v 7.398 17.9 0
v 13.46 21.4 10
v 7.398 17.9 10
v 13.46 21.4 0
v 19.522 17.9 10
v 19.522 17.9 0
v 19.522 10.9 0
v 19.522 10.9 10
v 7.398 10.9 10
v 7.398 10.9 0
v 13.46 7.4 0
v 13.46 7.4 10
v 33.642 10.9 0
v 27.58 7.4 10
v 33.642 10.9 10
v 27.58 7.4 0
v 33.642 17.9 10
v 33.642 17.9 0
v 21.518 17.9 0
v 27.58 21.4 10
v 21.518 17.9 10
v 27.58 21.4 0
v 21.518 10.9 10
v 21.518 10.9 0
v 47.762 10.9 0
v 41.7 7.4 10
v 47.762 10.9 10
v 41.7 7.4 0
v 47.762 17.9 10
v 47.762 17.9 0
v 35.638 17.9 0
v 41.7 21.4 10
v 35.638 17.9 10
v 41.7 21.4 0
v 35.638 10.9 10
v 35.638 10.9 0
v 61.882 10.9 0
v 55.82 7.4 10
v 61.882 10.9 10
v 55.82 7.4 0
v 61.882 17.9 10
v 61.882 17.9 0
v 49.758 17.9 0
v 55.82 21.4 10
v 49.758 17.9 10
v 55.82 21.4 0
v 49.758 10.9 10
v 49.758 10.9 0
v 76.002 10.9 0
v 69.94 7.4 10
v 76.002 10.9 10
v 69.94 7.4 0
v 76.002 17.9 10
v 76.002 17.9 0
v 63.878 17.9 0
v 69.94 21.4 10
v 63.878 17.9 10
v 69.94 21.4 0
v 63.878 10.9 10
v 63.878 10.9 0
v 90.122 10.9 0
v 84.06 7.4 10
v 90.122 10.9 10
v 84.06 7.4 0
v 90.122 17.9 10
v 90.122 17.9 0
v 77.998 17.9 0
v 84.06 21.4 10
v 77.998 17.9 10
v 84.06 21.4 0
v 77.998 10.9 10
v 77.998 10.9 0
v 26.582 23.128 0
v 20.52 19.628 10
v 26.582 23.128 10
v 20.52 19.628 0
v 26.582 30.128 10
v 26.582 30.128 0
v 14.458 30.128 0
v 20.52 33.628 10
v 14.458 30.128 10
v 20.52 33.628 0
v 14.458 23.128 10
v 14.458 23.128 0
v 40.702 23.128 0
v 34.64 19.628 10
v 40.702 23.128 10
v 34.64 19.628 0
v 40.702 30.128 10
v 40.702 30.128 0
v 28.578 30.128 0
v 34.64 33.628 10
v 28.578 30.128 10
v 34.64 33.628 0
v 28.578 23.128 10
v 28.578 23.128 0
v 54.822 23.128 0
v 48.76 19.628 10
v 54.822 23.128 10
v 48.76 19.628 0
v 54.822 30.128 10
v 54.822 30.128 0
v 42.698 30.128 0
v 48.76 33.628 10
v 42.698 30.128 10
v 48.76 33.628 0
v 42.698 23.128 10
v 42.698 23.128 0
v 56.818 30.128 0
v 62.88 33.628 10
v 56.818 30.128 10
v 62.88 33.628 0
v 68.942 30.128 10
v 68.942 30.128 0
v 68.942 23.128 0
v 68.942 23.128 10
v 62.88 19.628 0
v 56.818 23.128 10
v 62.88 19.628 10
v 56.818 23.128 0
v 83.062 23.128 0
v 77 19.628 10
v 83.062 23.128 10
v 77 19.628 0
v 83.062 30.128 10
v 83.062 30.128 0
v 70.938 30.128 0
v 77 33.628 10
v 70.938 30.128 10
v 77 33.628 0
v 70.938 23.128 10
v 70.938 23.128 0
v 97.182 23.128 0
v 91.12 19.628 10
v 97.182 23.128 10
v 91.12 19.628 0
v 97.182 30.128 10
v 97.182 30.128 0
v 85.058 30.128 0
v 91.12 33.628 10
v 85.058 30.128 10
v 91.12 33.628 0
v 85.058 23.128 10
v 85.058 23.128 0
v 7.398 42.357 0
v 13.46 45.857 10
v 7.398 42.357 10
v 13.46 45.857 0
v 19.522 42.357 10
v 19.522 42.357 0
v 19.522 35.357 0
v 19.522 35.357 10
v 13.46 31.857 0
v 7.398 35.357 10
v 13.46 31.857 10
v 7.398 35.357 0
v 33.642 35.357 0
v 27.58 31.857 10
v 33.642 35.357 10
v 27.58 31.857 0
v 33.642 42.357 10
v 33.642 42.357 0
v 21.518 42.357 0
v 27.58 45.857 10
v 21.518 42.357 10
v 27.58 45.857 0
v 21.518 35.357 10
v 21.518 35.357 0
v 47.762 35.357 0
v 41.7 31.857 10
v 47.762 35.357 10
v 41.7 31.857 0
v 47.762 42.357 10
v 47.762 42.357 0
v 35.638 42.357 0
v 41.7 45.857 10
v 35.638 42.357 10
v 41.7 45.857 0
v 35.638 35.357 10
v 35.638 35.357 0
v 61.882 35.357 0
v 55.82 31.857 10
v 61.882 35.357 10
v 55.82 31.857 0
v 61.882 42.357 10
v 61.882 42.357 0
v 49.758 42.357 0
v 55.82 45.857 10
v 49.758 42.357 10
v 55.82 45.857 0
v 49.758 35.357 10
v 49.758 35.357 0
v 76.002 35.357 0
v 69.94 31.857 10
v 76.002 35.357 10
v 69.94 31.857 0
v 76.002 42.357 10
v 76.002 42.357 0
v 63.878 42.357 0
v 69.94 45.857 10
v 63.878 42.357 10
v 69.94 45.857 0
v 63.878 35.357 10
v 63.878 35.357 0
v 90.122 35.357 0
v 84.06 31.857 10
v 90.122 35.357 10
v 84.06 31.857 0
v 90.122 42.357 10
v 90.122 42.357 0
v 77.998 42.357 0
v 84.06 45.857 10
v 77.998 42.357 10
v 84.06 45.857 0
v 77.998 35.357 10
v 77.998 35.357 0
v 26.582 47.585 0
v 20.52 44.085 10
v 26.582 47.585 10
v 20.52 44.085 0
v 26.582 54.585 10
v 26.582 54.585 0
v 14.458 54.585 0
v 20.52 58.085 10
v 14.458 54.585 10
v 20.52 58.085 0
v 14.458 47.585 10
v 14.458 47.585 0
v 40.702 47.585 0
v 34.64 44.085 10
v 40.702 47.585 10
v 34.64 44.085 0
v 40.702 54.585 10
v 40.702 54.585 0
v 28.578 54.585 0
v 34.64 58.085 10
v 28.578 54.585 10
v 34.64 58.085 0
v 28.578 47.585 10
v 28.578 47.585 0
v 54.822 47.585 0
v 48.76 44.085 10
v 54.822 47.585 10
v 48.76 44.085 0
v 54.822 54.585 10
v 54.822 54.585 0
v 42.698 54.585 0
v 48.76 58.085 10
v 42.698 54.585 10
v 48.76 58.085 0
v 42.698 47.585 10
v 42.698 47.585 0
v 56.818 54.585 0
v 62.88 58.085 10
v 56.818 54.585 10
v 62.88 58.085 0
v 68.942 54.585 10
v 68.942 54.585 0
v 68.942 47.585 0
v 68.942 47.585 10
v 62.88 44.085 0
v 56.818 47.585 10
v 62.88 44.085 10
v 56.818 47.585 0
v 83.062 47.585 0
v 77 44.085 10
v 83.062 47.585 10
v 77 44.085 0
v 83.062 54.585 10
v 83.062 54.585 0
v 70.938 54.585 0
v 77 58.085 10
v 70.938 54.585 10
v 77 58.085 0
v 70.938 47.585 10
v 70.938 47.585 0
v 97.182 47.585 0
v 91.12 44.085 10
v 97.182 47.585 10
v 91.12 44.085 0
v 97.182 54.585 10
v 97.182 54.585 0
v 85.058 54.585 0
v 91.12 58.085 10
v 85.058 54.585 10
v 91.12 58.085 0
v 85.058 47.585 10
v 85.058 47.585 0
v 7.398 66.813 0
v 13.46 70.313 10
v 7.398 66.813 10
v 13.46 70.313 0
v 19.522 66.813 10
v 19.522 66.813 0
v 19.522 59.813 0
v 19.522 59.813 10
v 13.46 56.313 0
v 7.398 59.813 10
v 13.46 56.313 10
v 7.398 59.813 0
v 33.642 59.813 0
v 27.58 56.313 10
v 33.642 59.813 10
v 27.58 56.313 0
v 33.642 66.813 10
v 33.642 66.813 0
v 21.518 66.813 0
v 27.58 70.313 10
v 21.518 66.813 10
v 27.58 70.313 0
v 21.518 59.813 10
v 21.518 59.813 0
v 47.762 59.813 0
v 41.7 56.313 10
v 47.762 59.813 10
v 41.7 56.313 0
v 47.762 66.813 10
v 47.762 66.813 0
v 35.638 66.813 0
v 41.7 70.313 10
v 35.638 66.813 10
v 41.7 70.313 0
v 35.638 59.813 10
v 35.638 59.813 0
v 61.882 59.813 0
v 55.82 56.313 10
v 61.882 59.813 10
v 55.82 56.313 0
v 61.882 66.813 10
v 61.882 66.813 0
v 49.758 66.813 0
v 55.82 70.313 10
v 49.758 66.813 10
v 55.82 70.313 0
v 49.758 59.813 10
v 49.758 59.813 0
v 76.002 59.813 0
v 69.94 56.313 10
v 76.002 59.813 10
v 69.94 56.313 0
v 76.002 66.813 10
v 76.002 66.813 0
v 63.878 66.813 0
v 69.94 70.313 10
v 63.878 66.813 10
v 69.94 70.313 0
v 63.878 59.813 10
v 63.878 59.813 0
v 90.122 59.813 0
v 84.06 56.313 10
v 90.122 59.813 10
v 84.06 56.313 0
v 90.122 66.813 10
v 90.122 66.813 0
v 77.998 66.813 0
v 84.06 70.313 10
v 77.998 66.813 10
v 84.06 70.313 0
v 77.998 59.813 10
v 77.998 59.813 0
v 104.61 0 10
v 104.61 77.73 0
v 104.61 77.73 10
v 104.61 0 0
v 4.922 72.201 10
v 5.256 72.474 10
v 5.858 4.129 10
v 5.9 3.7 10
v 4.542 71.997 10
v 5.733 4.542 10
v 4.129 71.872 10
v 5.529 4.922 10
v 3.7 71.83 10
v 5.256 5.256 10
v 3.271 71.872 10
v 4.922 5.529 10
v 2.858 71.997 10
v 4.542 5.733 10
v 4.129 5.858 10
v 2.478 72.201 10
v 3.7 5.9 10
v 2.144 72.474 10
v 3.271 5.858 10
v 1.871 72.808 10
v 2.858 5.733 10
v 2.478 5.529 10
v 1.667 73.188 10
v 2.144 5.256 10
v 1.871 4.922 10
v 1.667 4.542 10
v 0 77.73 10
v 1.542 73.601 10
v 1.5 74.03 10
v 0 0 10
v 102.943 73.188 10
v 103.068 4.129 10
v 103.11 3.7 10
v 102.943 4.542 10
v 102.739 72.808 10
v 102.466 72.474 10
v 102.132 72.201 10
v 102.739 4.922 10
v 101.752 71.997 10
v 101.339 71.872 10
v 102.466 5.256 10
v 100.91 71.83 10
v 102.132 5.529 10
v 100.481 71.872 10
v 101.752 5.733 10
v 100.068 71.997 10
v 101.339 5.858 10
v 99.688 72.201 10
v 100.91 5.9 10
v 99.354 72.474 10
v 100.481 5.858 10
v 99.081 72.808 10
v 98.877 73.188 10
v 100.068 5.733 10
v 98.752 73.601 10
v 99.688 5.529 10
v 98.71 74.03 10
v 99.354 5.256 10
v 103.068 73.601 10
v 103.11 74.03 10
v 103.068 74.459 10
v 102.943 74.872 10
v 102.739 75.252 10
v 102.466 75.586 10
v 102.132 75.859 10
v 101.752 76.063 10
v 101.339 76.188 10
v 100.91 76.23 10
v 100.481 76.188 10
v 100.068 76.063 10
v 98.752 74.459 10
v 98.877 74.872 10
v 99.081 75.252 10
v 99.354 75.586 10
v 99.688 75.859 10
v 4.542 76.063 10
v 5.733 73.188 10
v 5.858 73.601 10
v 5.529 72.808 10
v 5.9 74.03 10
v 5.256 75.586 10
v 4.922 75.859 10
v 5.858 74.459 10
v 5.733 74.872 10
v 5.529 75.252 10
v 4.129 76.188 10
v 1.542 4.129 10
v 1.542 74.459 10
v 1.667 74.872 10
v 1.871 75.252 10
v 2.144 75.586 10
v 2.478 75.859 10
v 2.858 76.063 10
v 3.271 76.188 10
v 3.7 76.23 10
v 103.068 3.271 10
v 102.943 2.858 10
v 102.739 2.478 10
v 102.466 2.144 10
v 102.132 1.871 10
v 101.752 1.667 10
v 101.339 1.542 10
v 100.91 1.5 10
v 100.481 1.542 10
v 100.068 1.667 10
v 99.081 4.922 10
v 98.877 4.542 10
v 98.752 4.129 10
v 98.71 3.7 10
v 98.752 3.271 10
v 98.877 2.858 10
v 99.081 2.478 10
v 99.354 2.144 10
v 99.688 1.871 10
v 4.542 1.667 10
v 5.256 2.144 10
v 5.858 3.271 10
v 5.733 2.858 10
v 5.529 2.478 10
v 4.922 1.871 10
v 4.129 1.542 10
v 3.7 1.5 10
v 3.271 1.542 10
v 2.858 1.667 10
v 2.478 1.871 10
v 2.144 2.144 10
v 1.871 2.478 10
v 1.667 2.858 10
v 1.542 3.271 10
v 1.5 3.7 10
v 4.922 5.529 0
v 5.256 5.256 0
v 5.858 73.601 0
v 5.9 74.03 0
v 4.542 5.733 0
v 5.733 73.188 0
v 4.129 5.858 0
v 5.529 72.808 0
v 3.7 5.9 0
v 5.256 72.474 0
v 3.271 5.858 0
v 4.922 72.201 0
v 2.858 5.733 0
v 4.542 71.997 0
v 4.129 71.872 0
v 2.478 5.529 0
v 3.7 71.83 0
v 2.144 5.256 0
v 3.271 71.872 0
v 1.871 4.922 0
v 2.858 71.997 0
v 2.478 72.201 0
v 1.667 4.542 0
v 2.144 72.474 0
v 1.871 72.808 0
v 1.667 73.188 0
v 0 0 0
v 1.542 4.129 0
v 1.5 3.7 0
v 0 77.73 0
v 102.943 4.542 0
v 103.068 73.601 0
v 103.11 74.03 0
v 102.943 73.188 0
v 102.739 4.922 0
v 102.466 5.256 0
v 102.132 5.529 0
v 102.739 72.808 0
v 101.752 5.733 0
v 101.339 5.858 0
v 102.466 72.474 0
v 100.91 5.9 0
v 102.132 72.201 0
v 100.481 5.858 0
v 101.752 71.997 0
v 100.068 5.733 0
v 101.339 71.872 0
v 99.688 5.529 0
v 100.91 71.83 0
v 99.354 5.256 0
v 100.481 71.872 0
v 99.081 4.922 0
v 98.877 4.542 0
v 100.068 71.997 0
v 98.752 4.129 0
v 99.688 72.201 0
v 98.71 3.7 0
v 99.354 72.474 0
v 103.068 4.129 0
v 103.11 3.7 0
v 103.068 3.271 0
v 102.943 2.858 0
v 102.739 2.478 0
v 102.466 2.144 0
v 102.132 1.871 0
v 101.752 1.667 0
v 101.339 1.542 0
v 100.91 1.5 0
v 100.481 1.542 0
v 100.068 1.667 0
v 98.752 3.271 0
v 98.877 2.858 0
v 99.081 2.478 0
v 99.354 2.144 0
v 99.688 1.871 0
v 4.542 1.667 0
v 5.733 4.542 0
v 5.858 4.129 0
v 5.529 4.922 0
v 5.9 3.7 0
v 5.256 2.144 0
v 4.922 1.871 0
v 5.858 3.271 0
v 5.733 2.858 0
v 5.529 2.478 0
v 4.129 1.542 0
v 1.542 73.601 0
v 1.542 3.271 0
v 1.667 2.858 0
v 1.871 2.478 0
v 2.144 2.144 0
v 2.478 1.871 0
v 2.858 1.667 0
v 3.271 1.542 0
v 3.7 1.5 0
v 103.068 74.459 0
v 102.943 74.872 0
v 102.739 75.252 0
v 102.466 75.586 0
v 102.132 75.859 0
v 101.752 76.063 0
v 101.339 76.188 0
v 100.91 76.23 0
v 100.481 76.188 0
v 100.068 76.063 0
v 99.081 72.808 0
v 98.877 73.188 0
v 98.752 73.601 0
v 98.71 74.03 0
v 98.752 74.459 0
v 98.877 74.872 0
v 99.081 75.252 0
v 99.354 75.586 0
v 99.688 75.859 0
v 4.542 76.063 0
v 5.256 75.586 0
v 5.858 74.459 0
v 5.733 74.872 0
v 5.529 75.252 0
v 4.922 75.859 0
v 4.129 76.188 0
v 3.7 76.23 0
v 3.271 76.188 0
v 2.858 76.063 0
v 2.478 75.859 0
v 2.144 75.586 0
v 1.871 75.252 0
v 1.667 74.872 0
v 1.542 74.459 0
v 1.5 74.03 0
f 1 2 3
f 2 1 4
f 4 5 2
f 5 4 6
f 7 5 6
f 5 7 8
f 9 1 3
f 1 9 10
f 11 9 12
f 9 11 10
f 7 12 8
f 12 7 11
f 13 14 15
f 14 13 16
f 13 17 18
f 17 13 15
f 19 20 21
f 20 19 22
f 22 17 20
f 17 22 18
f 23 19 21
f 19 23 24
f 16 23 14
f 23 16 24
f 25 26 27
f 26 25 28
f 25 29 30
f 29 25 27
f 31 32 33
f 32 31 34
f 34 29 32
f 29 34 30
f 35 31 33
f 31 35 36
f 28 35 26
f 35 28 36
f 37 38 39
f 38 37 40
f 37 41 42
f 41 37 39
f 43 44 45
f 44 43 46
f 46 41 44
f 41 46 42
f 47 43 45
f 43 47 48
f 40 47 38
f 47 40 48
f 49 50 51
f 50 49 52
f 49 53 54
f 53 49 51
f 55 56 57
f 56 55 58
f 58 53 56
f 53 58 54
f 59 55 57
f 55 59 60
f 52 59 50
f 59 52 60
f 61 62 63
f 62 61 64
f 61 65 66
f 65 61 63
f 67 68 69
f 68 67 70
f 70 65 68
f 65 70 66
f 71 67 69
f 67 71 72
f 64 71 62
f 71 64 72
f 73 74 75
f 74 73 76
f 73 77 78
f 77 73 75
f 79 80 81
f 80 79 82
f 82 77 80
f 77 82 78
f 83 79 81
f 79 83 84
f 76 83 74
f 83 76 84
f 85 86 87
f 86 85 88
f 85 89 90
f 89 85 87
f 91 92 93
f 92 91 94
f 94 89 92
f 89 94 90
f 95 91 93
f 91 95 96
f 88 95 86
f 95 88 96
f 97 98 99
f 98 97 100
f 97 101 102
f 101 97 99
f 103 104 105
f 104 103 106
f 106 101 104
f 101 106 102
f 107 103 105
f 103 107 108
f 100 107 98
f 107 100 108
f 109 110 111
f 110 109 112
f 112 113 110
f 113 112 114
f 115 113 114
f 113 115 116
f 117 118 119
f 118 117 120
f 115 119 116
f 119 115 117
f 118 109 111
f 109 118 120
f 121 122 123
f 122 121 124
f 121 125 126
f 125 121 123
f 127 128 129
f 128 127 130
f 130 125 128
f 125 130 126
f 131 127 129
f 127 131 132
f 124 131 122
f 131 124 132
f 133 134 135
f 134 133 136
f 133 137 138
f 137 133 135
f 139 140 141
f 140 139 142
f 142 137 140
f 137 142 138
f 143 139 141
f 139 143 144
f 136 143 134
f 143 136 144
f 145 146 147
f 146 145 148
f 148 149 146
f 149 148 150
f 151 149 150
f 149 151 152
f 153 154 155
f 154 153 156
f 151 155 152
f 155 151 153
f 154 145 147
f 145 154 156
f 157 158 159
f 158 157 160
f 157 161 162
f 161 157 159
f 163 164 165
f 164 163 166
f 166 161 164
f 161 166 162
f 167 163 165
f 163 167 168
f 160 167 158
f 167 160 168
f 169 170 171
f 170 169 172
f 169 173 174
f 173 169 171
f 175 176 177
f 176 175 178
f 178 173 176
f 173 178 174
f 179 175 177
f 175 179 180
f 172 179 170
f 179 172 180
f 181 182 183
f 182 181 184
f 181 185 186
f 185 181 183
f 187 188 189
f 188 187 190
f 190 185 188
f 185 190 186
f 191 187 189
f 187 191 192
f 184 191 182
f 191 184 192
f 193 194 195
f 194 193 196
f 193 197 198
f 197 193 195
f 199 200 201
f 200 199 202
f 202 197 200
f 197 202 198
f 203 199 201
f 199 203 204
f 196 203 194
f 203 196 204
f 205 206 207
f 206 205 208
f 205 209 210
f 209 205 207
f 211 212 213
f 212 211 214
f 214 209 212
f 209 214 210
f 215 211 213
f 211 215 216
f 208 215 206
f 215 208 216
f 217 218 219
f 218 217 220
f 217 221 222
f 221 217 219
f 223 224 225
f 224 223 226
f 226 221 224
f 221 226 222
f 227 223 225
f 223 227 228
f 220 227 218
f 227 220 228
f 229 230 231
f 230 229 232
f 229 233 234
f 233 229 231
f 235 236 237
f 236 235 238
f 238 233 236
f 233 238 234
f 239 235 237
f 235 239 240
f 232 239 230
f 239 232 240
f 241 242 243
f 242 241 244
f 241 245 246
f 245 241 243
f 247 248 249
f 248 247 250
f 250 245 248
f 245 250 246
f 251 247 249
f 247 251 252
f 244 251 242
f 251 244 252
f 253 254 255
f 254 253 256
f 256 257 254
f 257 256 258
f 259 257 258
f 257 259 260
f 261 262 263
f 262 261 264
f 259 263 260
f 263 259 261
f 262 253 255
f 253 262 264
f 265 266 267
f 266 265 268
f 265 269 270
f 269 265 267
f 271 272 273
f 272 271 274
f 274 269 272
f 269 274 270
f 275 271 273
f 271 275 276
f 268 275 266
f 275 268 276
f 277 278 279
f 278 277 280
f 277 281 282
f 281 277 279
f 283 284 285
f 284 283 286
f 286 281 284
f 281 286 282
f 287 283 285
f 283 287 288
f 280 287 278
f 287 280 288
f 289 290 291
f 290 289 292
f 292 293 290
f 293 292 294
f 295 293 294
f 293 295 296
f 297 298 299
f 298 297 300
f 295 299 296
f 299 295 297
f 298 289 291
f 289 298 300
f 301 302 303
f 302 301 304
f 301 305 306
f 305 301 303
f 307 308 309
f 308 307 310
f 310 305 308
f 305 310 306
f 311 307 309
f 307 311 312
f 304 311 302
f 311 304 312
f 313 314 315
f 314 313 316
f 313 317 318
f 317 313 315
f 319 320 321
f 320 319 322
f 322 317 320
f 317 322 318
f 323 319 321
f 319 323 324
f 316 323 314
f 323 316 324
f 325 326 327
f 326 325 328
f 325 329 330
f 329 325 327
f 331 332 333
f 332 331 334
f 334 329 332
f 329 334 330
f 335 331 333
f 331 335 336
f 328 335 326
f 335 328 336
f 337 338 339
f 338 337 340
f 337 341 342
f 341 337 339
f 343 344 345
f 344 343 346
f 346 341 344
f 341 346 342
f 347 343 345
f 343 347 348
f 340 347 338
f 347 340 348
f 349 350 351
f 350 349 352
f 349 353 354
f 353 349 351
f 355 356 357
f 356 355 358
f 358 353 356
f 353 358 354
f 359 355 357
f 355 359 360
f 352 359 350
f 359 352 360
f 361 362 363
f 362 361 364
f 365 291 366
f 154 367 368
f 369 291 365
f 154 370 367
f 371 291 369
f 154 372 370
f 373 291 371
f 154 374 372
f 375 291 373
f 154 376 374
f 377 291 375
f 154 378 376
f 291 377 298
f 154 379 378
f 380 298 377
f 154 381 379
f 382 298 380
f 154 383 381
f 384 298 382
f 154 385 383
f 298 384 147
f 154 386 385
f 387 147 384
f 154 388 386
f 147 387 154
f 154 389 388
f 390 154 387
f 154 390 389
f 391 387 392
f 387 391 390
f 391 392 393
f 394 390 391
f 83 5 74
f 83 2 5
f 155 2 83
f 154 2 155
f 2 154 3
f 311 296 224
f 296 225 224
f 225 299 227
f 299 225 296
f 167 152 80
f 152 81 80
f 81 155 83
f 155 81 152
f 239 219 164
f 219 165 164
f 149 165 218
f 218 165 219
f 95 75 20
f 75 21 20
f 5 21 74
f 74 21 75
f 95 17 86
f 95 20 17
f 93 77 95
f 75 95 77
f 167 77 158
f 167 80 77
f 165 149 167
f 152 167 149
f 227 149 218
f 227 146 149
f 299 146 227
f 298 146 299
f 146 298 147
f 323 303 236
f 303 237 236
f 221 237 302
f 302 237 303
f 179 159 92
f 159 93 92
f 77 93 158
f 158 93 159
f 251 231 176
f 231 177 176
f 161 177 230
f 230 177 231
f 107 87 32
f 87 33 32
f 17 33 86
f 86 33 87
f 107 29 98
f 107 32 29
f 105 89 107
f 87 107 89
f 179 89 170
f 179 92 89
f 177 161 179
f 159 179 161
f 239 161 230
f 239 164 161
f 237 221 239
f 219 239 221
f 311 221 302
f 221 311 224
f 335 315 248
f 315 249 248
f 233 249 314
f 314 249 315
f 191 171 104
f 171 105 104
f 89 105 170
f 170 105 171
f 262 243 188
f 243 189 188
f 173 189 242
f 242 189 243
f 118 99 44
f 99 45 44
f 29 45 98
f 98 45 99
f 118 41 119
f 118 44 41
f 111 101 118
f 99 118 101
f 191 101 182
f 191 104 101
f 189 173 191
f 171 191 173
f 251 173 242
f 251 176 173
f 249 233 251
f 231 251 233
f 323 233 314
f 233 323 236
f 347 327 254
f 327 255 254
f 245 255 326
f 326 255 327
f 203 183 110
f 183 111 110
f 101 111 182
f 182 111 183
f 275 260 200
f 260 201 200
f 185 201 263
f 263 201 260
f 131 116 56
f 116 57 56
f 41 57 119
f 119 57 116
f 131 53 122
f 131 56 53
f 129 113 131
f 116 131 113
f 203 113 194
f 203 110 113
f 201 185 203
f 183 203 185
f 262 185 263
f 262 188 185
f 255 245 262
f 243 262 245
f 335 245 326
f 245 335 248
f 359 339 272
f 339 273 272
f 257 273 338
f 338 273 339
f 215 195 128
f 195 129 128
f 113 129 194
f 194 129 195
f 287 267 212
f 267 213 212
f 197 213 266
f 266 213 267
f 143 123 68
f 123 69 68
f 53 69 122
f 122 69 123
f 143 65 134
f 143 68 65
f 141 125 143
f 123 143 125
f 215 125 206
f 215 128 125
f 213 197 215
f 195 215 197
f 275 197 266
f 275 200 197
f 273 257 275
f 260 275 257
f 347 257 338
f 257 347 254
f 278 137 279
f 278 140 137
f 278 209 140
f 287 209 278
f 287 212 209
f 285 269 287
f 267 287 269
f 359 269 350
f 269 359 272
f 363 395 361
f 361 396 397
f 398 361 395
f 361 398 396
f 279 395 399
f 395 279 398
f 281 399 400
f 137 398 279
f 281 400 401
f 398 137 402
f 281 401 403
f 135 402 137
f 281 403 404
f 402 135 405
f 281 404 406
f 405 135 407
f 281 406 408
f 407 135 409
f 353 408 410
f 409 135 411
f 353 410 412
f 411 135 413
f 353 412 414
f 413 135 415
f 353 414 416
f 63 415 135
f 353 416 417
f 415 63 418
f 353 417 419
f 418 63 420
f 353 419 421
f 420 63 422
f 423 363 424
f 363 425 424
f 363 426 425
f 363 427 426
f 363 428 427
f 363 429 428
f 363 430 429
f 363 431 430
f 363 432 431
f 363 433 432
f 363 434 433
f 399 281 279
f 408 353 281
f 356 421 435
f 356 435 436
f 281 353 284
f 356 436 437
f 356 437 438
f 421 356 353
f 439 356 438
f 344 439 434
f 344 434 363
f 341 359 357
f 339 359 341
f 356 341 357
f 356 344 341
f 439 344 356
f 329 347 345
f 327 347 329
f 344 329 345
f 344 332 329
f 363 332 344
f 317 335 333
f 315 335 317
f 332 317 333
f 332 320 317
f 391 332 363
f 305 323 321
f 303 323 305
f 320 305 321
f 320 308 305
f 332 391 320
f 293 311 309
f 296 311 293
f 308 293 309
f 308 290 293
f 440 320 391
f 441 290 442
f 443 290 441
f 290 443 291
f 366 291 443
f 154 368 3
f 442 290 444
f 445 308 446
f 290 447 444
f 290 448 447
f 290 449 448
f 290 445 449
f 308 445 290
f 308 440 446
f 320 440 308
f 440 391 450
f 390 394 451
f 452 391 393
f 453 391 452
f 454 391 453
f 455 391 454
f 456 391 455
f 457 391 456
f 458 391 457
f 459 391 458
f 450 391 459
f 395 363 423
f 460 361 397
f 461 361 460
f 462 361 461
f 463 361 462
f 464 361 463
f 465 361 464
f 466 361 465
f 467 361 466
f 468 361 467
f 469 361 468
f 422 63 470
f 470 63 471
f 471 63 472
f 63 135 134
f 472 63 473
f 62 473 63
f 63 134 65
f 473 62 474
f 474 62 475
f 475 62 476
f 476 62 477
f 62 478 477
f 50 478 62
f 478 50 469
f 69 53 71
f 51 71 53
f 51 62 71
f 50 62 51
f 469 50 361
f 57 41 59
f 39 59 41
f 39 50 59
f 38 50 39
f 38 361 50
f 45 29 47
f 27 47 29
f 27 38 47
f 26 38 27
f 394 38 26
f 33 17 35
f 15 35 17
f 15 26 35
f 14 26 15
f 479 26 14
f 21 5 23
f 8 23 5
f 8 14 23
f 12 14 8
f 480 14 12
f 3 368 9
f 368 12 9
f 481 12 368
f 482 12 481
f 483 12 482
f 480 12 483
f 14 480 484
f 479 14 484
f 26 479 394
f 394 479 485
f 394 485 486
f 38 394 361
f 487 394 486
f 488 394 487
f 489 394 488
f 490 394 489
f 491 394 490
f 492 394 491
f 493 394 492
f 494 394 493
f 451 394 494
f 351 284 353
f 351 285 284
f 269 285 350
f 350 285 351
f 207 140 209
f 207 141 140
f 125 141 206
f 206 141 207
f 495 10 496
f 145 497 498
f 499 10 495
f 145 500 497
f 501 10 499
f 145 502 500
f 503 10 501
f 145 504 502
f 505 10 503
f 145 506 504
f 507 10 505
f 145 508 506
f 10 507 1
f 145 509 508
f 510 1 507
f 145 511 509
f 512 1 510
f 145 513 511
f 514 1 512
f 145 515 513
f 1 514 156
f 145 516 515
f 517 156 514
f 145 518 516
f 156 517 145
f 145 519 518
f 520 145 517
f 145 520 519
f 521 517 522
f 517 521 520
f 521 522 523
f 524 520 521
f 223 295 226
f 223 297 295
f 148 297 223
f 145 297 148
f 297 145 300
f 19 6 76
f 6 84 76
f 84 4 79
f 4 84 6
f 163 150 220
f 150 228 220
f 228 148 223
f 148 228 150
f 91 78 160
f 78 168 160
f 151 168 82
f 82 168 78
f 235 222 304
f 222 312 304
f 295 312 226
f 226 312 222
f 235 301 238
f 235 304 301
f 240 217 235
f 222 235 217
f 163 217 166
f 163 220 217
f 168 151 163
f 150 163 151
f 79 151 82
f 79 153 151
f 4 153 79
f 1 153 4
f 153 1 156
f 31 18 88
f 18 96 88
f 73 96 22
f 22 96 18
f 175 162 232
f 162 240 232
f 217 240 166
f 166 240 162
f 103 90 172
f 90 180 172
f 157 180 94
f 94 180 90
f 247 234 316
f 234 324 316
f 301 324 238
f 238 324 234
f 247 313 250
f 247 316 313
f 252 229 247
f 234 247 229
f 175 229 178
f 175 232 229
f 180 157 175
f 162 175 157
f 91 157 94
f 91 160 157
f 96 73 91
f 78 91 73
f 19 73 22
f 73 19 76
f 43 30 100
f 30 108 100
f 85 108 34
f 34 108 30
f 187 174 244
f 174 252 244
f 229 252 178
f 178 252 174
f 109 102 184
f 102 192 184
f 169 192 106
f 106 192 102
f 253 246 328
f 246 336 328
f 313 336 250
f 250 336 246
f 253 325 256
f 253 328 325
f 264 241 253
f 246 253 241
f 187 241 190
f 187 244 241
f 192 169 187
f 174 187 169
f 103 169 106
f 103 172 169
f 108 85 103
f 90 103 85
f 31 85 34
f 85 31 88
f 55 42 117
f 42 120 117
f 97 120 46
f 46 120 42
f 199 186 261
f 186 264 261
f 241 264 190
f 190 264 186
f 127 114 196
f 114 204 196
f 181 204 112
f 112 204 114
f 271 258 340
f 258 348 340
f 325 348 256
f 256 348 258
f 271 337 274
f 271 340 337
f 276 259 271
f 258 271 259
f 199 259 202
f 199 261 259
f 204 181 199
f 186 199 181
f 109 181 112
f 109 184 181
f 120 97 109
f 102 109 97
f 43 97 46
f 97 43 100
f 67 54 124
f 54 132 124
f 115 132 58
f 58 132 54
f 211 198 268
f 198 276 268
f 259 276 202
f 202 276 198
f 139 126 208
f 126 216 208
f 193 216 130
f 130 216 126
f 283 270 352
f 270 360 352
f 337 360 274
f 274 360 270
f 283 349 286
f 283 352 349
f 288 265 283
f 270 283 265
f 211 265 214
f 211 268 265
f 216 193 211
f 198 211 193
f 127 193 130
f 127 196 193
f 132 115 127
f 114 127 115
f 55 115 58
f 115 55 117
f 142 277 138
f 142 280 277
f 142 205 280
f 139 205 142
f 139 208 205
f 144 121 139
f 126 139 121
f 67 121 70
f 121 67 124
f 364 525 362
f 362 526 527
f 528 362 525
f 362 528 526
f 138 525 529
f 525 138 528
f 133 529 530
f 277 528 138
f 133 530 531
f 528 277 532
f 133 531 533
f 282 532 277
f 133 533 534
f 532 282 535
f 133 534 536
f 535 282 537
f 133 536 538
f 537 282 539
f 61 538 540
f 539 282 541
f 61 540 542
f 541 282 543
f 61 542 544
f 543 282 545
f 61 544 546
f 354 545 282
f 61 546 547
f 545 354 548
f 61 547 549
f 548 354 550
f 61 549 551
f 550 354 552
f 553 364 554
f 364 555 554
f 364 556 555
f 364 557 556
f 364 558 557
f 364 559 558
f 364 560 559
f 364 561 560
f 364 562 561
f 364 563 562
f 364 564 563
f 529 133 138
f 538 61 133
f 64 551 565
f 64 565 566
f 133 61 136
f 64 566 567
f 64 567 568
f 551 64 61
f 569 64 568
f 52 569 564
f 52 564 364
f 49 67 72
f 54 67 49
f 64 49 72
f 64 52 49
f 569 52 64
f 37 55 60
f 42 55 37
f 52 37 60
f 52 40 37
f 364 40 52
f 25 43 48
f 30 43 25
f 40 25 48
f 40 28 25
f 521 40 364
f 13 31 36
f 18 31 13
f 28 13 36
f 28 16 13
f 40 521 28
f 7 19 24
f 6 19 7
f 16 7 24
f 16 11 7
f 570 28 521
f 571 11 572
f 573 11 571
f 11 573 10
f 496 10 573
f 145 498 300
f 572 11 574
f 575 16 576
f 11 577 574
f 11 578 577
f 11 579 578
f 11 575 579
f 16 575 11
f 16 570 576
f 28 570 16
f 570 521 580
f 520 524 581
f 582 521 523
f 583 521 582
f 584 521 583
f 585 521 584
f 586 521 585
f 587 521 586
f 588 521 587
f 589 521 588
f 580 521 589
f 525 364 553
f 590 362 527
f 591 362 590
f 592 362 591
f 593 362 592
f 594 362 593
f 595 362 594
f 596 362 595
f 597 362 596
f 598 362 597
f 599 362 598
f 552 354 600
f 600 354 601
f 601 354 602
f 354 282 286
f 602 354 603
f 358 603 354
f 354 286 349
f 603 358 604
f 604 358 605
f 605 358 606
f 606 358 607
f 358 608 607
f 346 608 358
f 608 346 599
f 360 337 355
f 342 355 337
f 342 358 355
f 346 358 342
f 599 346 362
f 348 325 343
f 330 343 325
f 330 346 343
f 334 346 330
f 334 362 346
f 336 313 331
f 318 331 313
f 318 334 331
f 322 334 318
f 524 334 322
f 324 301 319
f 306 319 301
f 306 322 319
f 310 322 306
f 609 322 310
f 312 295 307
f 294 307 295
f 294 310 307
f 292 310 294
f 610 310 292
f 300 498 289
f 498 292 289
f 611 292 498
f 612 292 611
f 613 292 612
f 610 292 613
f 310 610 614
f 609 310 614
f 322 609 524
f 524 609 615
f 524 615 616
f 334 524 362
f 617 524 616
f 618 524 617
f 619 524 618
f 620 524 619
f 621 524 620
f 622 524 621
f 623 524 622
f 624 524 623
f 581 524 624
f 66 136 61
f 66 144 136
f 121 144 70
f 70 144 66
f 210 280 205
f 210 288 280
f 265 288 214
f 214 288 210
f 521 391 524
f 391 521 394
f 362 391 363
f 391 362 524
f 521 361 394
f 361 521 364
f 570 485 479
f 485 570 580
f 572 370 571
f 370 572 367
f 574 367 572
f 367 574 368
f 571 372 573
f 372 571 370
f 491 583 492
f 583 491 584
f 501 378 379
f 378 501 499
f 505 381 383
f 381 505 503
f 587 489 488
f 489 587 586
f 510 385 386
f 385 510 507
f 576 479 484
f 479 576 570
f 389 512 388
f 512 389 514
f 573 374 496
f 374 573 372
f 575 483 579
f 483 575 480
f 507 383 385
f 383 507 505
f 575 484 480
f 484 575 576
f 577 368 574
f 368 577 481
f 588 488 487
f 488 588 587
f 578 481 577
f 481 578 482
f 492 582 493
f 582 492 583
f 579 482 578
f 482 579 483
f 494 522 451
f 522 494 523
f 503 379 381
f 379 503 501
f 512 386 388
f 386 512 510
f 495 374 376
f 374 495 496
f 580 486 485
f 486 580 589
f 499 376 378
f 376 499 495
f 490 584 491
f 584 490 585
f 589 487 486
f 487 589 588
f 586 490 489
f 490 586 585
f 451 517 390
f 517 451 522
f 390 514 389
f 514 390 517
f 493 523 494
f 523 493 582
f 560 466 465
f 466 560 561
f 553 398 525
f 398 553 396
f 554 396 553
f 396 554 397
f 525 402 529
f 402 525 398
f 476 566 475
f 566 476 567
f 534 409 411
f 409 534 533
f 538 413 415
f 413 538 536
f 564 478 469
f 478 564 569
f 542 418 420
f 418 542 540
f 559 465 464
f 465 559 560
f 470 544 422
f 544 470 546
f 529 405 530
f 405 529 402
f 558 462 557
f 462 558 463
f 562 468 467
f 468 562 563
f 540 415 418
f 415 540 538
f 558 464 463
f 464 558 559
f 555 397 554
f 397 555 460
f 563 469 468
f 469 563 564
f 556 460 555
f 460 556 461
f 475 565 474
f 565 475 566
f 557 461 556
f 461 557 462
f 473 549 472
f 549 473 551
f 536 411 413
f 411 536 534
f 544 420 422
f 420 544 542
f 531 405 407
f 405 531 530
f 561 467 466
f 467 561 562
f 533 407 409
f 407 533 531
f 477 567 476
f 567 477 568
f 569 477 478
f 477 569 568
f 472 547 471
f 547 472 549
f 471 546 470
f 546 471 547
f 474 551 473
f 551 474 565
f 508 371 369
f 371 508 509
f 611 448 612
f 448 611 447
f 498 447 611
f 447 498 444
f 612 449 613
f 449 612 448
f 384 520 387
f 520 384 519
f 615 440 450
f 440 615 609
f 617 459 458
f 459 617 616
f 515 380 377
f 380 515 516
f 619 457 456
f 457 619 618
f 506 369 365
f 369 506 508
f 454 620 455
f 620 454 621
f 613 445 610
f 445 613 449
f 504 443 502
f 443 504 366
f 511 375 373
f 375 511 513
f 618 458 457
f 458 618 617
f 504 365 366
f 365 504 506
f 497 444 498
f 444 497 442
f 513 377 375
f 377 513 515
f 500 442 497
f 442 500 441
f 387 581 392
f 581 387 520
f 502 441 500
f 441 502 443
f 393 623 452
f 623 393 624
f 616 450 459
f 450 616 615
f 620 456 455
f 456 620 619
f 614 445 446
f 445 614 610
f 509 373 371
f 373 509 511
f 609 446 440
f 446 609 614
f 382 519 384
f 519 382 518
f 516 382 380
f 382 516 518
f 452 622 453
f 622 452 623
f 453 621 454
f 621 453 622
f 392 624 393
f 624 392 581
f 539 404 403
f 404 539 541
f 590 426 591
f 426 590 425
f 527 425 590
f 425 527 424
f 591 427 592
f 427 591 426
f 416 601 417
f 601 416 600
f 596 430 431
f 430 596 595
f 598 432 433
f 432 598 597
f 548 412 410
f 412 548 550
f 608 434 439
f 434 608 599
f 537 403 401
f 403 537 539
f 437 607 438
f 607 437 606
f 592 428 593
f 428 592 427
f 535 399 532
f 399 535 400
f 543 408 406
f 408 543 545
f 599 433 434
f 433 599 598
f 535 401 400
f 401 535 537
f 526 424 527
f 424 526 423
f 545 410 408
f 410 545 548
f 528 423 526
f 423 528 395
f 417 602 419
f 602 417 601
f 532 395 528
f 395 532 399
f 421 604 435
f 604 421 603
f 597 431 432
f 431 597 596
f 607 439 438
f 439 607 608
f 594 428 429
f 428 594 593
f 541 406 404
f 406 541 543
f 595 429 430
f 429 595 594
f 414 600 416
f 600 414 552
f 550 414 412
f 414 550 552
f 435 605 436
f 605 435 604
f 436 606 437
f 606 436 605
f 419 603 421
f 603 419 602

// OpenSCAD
$fn = 32;

// ----------------------------------------------------------------------
// Honeycomb panel: 104.61 x 77.73 mm, 30 cells of 14 mm
// ----------------------------------------------------------------------

// --- parameters (mm) ---
panel_w = 104.61;         // panel width
panel_d = 77.73;          // panel depth
thick = 10;               // panel thickness
cell_r = 7;               // hex cell circumradius
pitch = 14.12;            // hex cell pitch (centre to centre)
web = 2;                  // web between the cells
columns = 6;              // columns of cells
rows = 5;                 // rows of cells
cell_count = 30;          // total cells
shift_x = 13.46;          // first cell offset in x
shift_y = 14.4;           // first cell offset in y
mount_d = 4.4;            // corner mounting holes
hole_off = 3.7;           // mounting hole offset from the corners

difference() {
  union() {
    cube([panel_w, panel_d, thick]);
  }
  /* hexagonal cells, point-up, cut right through the plate */
  for (row = [0 : rows - 1]) {
    for (col = [0 : columns - 1]) {
      translate([shift_x + col * pitch + (row % 2) * pitch / 2, shift_y + row * pitch * 0.866025, -2.5]) rotate([0, 0, 30]) cylinder(h = thick + 5, d = 2 * cell_r, $fn = 6);
    }
  }
  /* corner mounting holes, clear of the outer cell web */
  translate([3.7, 3.7, -2.5]) cylinder(h = thick + 5, d = mount_d);
  translate([100.91, 3.7, -2.5]) cylinder(h = thick + 5, d = mount_d);
  translate([3.7, 74.03, -2.5]) cylinder(h = thick + 5, d = mount_d);
  translate([100.91, 74.03, -2.5]) cylinder(h = thick + 5, d = mount_d);
}
